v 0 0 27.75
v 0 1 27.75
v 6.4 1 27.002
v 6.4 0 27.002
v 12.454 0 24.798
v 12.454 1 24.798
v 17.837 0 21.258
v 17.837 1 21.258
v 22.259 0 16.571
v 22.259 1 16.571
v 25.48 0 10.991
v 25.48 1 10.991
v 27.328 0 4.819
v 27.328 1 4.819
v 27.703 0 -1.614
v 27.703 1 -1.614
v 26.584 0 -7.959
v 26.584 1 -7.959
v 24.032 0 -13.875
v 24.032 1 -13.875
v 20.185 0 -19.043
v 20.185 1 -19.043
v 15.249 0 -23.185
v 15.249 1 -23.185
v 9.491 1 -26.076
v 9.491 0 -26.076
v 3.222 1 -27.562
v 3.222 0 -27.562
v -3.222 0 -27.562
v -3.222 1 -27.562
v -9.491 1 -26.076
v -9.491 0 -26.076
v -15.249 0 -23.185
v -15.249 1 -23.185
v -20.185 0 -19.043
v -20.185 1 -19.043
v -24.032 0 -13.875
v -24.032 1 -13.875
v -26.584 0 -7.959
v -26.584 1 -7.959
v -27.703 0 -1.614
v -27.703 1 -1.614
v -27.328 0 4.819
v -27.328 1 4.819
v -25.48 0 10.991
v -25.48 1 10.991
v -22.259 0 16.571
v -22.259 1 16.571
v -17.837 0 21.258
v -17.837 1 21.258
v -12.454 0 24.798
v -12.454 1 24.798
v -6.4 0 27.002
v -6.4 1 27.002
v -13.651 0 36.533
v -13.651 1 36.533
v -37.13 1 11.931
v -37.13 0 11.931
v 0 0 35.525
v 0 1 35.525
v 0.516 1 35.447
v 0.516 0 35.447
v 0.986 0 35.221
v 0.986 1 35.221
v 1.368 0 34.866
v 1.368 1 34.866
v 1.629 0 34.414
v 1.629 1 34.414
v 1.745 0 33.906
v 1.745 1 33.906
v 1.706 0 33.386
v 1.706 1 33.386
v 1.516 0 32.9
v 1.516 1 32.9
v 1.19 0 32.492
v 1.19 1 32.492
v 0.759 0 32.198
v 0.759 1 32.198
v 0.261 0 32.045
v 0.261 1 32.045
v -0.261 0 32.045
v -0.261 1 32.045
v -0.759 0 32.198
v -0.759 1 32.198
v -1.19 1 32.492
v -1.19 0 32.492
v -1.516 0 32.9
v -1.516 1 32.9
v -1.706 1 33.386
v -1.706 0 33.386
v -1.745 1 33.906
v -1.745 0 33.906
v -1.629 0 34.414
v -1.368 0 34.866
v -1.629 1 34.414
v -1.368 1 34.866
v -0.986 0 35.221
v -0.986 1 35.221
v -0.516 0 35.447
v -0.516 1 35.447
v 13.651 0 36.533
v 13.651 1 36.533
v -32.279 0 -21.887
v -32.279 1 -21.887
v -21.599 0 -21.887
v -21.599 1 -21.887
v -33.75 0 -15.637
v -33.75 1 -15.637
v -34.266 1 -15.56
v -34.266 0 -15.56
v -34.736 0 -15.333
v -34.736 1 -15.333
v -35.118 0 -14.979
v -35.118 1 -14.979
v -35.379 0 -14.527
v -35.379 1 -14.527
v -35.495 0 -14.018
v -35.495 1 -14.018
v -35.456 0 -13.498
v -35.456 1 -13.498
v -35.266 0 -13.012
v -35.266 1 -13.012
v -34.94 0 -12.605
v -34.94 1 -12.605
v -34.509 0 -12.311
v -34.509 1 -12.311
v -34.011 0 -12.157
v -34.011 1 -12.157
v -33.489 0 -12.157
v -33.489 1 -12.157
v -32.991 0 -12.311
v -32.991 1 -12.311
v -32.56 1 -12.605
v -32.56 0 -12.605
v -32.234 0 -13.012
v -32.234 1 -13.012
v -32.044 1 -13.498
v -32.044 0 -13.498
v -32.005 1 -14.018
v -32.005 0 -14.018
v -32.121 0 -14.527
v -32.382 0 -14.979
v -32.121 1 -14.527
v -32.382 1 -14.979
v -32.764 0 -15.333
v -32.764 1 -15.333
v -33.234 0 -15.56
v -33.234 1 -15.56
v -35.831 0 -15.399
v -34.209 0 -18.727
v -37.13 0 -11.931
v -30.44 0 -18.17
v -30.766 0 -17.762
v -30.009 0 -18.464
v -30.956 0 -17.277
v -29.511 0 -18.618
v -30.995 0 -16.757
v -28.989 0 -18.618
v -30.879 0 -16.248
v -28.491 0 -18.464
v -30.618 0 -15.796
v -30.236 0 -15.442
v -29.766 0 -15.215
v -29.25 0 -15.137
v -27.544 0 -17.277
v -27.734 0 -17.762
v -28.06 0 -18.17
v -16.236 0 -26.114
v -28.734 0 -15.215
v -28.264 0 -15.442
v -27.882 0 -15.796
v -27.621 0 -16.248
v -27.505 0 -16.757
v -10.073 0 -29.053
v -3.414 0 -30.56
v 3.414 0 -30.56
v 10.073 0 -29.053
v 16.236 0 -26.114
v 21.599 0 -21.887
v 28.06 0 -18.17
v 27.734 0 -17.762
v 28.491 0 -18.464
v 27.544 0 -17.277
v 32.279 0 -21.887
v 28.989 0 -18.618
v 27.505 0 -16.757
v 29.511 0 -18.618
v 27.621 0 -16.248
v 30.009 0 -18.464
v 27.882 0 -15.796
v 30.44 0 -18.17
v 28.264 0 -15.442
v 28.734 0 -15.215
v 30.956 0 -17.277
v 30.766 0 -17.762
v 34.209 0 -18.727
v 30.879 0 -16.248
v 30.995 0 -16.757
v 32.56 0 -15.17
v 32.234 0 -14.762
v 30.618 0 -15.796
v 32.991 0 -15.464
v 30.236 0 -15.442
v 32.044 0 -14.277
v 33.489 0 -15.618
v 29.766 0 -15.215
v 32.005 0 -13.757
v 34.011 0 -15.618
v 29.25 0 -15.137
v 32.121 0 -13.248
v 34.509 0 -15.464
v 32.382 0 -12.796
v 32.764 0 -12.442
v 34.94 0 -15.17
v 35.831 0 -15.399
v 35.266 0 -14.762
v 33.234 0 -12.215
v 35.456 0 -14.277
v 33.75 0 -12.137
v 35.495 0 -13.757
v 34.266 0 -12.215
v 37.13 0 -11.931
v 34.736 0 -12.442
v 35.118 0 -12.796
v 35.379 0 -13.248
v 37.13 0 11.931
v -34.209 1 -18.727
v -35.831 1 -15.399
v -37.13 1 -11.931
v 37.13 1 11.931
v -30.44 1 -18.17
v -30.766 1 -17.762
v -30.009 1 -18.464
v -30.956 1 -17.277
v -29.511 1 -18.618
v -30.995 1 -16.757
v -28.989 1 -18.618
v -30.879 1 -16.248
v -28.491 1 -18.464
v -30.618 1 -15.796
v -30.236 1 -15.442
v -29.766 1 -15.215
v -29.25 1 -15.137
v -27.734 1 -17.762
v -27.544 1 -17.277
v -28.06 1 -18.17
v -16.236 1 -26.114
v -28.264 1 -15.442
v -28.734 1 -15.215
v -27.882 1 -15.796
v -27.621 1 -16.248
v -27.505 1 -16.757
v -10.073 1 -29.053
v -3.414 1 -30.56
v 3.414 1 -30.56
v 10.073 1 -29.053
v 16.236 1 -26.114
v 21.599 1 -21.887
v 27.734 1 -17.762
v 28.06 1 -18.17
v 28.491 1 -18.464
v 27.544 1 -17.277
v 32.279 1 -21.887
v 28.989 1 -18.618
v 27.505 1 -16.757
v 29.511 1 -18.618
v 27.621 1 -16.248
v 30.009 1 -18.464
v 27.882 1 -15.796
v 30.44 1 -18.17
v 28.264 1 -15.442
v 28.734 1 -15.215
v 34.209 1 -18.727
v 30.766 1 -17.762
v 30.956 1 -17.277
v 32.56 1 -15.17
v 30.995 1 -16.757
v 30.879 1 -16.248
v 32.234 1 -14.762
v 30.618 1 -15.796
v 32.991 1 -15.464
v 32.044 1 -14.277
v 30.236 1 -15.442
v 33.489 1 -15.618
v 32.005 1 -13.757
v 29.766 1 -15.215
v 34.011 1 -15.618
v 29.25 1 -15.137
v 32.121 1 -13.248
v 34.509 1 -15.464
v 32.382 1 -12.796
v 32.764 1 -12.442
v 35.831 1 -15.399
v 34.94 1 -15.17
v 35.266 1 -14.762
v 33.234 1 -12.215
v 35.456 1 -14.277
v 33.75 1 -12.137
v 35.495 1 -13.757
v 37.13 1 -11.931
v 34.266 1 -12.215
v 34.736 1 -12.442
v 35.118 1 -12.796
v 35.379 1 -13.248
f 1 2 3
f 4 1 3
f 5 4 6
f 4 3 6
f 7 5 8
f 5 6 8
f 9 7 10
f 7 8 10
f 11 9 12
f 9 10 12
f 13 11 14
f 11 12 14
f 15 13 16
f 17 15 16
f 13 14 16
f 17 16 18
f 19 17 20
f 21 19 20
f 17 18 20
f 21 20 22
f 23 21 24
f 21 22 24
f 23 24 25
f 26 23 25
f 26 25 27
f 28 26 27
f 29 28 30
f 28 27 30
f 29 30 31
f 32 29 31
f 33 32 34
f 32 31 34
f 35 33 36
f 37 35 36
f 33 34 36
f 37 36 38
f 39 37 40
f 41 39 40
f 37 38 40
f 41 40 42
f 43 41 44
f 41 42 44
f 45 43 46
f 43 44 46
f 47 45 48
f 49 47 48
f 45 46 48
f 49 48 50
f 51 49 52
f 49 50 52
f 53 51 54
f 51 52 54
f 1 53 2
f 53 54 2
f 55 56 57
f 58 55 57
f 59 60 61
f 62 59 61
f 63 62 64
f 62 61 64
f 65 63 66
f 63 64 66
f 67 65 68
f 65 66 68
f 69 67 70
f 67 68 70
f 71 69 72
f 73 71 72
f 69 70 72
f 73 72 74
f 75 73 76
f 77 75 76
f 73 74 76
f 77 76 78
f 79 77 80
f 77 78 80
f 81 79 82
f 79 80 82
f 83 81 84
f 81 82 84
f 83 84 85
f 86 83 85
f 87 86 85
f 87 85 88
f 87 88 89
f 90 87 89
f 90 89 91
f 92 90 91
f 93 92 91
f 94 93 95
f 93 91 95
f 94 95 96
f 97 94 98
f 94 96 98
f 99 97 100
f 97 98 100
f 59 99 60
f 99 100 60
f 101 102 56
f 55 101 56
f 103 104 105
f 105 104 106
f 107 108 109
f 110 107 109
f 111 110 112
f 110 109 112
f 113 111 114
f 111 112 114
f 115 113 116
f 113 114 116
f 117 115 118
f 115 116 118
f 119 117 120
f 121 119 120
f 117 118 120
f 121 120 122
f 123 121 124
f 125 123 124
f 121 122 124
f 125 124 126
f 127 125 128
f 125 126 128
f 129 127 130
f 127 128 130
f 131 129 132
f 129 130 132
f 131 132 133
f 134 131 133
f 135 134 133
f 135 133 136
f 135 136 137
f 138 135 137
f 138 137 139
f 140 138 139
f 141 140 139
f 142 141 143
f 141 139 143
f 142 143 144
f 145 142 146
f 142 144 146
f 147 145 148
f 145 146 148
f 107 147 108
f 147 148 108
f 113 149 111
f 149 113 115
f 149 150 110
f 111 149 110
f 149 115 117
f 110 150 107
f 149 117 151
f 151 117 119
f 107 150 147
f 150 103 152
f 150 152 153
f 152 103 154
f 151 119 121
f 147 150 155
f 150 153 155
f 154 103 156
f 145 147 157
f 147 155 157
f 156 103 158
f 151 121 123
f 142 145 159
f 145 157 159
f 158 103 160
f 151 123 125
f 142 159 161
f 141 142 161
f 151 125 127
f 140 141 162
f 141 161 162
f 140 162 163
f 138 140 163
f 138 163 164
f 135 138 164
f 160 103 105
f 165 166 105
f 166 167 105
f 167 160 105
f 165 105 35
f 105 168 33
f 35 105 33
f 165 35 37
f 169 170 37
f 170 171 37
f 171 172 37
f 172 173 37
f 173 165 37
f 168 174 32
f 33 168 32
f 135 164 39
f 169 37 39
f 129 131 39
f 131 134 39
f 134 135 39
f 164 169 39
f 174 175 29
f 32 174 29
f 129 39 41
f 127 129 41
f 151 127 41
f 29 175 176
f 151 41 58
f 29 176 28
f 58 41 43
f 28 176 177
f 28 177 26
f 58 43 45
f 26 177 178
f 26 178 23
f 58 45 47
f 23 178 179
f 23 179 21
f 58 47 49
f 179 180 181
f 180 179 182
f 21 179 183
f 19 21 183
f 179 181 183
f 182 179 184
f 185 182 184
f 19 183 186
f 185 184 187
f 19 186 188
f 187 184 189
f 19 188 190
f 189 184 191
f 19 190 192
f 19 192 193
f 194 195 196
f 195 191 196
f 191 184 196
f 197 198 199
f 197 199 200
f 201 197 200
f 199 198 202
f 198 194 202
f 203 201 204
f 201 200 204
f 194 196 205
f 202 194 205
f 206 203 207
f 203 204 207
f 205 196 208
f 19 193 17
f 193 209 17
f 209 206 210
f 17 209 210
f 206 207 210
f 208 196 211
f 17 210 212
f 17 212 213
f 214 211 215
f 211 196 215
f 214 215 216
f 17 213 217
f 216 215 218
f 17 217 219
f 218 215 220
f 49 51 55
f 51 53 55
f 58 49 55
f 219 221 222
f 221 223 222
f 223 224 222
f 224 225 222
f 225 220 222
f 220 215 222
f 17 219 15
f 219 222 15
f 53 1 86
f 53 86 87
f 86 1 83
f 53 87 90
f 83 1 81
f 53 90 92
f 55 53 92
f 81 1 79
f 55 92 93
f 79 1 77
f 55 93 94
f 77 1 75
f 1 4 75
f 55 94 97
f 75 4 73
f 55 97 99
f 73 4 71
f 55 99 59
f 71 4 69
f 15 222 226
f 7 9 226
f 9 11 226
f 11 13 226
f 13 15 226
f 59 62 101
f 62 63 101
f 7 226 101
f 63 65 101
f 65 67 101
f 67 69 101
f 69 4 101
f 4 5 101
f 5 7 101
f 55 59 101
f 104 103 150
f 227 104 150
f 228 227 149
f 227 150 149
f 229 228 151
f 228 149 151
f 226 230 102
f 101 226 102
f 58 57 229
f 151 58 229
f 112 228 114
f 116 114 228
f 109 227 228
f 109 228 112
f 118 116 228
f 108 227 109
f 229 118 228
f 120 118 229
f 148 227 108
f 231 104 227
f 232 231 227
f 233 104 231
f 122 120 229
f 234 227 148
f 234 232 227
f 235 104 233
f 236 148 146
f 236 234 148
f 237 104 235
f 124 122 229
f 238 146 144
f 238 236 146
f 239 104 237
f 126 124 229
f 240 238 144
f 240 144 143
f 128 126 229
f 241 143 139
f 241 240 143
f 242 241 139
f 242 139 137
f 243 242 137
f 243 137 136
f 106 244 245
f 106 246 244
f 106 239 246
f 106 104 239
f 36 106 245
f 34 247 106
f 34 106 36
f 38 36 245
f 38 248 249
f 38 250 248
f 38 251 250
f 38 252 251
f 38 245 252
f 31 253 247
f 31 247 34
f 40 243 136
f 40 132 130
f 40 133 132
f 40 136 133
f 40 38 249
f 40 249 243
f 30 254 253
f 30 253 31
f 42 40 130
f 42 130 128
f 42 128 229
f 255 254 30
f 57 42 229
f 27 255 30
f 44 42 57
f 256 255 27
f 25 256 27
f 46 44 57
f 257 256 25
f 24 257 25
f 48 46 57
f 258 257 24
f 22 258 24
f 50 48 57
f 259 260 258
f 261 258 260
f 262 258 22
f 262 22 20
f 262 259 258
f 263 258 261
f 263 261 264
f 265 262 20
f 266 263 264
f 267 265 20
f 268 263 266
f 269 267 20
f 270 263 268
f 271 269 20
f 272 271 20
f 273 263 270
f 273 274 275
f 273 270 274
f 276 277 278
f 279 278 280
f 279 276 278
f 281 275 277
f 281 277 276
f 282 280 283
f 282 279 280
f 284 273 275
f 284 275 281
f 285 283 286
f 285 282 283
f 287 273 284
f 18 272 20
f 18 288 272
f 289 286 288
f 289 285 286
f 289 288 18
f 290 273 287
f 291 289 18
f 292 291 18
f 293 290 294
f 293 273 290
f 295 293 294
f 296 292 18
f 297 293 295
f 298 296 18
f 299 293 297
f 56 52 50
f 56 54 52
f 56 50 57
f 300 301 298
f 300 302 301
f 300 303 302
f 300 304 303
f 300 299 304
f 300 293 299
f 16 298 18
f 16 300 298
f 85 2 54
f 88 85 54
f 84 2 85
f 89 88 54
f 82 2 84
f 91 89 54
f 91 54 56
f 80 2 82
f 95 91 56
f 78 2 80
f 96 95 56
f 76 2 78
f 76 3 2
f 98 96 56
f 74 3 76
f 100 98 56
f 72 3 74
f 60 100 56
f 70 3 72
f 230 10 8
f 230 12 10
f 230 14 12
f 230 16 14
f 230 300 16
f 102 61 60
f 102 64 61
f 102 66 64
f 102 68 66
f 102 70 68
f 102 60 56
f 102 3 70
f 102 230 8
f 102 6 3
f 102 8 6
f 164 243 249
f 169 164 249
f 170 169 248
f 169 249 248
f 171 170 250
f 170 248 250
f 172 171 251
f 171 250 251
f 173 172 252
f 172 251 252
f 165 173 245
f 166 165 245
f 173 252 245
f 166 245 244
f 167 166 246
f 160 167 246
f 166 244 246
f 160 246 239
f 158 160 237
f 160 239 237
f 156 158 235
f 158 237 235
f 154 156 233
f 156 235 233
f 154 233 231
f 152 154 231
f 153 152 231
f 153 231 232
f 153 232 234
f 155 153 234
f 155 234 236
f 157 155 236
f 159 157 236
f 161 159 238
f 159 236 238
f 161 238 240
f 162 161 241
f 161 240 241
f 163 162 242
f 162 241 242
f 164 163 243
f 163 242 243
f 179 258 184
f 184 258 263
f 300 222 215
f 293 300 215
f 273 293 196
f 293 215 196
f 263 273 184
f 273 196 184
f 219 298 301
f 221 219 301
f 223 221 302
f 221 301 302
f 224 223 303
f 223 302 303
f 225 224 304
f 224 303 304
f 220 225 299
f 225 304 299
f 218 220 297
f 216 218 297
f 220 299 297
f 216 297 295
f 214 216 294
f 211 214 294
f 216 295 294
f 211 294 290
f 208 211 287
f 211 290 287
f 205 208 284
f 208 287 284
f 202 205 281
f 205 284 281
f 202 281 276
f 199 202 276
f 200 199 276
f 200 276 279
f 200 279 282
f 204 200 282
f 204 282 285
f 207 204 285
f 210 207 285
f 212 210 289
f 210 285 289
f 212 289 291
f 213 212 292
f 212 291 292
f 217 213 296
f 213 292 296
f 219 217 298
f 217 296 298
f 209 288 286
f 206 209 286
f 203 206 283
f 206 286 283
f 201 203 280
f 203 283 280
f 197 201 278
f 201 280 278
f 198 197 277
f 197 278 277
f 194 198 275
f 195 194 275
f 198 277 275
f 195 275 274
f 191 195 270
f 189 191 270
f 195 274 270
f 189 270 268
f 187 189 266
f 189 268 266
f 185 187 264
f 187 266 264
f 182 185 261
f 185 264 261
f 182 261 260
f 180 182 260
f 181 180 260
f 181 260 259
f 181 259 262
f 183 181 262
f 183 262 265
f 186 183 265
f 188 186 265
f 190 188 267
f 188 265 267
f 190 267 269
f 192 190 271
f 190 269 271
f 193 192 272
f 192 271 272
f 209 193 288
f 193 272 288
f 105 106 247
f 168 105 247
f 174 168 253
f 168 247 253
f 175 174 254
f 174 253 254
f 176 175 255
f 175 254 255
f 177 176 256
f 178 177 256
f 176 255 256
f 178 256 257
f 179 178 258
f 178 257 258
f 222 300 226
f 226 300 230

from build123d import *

# Parameters (mm, degrees)
SKETCH_1_R          = 39
EXTRUDE_1_DEPTH     = 1
SKETCH_2_R          = 1.75
CUT_EXTRUDE_1_DEPTH = 1
SKETCH_3_R          = 27.75
CUT_EXTRUDE_2_DEPTH = 1
SKETCH_4_R          = 1.75
CUT_EXTRUDE_3_DEPTH = 1
CUT_EXTRUDE_4_DEPTH = 1
CUT_EXTRUDE_5_DEPTH = 1


with BuildPart() as part:
    # 스케치1 → 보스-돌출1 (new body)
    with BuildSketch(Plane(origin=(0, 0, 0), x_dir=(1, 0, 0), z_dir=(0, 1, 0))):
        with Locations(Location((0, 0, 0), (0, 0, 270))):
            Circle(SKETCH_1_R)
    extrude(amount=EXTRUDE_1_DEPTH)

    # 스케치2 → 컷-돌출1 (cut)
    with BuildSketch(Plane(origin=(0, 1, 0), x_dir=(1, 0, 0), z_dir=(0, 1, 0))):
        with Locations(Location((29.25, 16.887495374, 0), (0, 0, 270))):
            Circle(SKETCH_2_R)
        with Locations(Location((-29.25, 16.887495374, 0), (0, 0, 270))):
            Circle(SKETCH_2_R)
        with Locations(Location((0, -33.774990748, 0), (0, 0, 270))):
            Circle(SKETCH_2_R)
    extrude(amount=-CUT_EXTRUDE_1_DEPTH, mode=Mode.SUBTRACT)

    # 스케치3 → 컷-돌출2 (cut)
    with BuildSketch(Plane(origin=(0, 1, 0), x_dir=(1, 0, 0), z_dir=(0, 1, 0))):
        with Locations(Location((0, 0, 0), (0, 0, 270))):
            Circle(SKETCH_3_R)
    extrude(amount=-CUT_EXTRUDE_2_DEPTH, mode=Mode.SUBTRACT)

    # 스케치4 → 컷-돌출3 (cut)
    with BuildSketch(Plane(origin=(0, 1, 0), x_dir=(1, 0, 0), z_dir=(0, 1, 0))):
        with Locations(Location((33.75, 13.887495374, 0), (0, 0, 270))):
            Circle(SKETCH_4_R)
        with Locations(Location((-33.75, 13.887495374, 0), (0, 0, 90))):
            Circle(SKETCH_4_R)
    extrude(amount=-CUT_EXTRUDE_3_DEPTH, mode=Mode.SUBTRACT)

    # 스케치5 → 컷-돌출4 (cut)
    with BuildSketch(Plane(origin=(0, 1, 0), x_dir=(1, 0, 0), z_dir=(0, 1, 0))):
        with BuildLine():
            Line((-41.165274156, 21.887495374), (-21.598612137, 21.887495374))
            ThreePointArc((-21.598612137, 21.887495374), (0, 30.75), (21.598612137, 21.887495374))
            Line((21.598612137, 21.887495374), (39.254048052, 21.887495374))
            Line((39.254048052, 21.887495374), (39.254048052, 46.515320785))
            Line((39.254048052, 46.515320785), (-41.165274156, 46.515320785))
            Line((-41.165274156, 46.515320785), (-41.165274156, 21.887495374))
        make_face()
    extrude(amount=-CUT_EXTRUDE_4_DEPTH, mode=Mode.SUBTRACT)

    # 스케치6 → 컷-돌출5 (cut)
    with BuildSketch(Plane(origin=(0, 1, 0), x_dir=(1, 0, 0), z_dir=(0, 1, 0))):
        Polygon((37.13022954, 19.961121964), (37.13022954, -11.930886568), (13.650716042, -36.532970746), (-13.650716042, -36.532970746), (-37.13022954, -11.930886568), (-37.13022954, 19.961121964), (-57.208624866, 19.961121964), (-57.208624866, -51.243312927), (54.097642537, -51.243312927), (54.097642537, 19.961121964), align=None)
    extrude(amount=-CUT_EXTRUDE_5_DEPTH, mode=Mode.SUBTRACT)


solid = part.part
